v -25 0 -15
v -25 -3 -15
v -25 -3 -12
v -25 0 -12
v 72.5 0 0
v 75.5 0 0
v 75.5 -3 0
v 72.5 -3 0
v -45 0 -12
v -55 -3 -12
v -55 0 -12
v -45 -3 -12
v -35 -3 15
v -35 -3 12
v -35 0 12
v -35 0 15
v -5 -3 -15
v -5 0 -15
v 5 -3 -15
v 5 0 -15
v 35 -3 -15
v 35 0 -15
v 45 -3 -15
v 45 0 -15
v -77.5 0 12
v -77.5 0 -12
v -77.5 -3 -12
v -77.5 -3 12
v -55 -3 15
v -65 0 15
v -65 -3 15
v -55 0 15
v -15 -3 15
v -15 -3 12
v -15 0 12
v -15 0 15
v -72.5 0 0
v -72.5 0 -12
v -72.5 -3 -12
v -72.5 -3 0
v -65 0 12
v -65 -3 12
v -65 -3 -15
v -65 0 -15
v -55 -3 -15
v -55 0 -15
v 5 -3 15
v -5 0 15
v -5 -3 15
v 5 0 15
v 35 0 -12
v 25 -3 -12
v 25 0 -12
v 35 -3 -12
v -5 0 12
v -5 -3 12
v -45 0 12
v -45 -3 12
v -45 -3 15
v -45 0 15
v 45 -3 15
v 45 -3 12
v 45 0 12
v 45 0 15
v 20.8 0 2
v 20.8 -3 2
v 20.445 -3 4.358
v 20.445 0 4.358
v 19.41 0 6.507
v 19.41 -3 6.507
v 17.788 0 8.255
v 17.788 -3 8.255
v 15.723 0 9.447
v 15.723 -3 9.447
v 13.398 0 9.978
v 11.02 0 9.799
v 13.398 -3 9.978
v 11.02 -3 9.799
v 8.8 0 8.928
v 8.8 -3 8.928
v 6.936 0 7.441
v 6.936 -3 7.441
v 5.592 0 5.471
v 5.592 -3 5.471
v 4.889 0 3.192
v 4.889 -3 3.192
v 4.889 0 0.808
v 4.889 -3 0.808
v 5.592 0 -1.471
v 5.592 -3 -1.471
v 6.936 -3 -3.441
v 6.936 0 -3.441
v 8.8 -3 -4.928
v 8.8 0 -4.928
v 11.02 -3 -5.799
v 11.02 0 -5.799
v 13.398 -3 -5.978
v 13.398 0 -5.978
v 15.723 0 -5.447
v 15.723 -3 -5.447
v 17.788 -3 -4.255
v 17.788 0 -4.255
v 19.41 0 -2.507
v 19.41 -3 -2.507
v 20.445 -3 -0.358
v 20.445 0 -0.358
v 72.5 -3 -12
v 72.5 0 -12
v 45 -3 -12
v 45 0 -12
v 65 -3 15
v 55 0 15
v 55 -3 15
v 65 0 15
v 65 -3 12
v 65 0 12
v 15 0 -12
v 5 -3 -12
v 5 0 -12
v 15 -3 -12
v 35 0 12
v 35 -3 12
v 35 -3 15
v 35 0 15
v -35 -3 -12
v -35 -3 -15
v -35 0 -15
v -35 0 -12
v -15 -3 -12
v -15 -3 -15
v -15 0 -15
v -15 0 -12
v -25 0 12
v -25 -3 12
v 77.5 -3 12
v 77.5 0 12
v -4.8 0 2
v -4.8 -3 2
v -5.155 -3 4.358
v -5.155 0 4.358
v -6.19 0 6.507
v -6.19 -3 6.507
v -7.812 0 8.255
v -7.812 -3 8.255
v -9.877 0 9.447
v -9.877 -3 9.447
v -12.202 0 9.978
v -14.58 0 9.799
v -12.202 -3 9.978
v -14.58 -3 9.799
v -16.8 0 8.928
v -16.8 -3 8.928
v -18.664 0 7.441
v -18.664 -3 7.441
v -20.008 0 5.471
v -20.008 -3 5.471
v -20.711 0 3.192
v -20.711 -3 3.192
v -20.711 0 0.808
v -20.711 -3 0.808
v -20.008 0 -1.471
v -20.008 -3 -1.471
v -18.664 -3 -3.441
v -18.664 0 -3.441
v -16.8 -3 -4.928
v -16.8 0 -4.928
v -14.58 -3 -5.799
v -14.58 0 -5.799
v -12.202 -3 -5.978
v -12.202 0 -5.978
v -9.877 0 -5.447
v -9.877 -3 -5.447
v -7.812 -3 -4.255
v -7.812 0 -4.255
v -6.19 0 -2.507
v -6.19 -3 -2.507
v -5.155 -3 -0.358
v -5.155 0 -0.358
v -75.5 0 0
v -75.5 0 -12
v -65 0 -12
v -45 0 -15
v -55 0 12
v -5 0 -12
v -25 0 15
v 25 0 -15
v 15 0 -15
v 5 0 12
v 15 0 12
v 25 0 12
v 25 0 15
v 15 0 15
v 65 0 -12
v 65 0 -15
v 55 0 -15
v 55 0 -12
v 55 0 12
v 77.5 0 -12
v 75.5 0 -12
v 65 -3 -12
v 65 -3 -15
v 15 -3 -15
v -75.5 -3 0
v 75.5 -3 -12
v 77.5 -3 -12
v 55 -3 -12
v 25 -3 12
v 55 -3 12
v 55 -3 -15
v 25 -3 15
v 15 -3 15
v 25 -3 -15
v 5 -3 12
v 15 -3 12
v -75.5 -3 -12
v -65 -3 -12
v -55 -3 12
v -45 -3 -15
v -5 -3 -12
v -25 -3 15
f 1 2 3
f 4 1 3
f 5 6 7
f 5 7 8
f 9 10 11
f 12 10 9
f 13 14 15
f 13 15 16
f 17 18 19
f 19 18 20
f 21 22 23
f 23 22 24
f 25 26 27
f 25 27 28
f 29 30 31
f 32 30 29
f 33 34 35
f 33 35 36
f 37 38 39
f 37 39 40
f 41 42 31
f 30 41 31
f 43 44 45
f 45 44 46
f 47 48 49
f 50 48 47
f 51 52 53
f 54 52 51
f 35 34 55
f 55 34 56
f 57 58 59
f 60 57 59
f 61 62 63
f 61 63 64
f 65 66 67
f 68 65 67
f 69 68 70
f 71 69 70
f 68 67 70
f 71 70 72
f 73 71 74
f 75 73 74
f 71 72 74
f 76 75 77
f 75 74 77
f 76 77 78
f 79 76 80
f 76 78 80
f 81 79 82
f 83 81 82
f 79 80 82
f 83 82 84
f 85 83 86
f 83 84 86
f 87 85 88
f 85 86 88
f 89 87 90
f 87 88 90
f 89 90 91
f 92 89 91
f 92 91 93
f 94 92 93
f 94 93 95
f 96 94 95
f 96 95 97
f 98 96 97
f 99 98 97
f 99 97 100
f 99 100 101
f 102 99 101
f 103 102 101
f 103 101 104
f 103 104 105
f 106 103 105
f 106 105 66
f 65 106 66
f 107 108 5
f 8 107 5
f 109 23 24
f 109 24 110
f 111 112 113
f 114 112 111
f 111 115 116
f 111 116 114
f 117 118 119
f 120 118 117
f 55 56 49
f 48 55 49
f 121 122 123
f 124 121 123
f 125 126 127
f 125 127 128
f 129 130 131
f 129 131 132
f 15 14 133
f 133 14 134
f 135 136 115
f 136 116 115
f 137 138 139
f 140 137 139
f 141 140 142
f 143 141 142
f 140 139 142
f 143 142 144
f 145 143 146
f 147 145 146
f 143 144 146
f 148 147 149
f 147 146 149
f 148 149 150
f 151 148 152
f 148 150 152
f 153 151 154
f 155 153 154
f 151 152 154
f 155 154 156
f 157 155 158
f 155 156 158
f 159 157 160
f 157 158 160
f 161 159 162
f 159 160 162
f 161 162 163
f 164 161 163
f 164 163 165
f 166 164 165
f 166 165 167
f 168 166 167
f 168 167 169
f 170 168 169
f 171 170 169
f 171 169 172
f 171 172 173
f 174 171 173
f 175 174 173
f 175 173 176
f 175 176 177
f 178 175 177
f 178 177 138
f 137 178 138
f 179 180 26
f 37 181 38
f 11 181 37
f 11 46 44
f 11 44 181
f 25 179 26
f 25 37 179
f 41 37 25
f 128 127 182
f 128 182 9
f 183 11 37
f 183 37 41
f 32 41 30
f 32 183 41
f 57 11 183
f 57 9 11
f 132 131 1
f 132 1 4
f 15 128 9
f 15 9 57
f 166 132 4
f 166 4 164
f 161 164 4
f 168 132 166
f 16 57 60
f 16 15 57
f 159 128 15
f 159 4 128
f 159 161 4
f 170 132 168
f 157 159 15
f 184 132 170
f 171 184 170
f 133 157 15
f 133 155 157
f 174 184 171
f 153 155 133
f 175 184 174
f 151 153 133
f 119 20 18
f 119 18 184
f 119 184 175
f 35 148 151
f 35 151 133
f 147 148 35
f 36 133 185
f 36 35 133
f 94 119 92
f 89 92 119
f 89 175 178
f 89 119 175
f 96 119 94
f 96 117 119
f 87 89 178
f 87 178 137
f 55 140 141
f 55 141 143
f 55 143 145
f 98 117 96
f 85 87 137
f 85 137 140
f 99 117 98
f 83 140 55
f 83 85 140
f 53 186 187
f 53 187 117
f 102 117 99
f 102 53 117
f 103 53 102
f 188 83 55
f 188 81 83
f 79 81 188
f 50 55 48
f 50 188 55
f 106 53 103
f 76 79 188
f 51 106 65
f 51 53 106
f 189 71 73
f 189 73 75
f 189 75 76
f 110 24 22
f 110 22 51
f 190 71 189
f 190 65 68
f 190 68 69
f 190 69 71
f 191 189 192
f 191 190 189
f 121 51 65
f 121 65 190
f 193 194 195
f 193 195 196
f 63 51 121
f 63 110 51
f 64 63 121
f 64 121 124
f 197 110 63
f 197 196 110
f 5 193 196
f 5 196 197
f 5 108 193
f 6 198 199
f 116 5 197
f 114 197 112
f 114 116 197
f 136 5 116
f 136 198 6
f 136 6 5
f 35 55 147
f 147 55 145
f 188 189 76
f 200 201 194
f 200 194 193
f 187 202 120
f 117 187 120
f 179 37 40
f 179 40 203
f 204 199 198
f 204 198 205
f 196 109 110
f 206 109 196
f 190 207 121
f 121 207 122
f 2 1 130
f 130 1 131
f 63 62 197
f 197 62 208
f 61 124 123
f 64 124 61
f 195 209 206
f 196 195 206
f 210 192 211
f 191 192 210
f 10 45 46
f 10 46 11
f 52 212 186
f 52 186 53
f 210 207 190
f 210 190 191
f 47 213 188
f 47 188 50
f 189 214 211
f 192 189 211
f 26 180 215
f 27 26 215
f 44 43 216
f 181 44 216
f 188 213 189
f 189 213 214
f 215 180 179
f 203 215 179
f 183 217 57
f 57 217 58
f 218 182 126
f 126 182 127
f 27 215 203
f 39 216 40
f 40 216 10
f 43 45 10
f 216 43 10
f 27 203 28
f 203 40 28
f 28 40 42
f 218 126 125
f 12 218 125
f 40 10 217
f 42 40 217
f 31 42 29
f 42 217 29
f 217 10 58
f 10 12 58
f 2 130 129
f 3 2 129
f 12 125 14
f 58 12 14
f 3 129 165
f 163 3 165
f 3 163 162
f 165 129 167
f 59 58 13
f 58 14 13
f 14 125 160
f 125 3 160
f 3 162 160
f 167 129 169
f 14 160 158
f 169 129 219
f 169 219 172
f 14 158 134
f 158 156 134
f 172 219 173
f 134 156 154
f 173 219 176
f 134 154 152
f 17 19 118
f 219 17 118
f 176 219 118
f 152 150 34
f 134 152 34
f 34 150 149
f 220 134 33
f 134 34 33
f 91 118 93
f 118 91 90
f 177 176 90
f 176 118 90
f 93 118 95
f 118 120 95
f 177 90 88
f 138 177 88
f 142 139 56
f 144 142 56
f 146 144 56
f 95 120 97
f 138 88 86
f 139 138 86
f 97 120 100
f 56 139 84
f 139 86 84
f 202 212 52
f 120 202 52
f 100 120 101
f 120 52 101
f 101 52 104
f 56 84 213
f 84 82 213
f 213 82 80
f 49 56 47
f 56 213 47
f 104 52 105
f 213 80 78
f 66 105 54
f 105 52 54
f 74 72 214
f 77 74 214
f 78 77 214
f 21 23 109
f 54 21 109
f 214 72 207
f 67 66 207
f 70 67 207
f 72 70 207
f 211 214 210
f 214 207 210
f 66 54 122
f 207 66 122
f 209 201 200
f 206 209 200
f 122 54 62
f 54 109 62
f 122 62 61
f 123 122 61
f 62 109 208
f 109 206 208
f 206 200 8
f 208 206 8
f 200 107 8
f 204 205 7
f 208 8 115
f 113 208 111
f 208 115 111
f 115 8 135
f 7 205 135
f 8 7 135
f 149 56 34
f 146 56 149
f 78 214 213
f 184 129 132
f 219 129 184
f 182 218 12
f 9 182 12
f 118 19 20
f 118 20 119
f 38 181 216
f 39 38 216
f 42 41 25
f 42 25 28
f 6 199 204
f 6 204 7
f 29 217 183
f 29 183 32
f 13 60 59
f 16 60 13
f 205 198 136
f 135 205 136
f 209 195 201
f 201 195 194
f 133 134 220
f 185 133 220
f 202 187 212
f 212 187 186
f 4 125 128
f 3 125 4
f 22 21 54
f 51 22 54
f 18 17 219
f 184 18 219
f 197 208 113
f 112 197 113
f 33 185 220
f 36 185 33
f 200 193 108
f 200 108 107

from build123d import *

# Parameters (mm, degrees)
F0_W     = 145
F0_H     = 30
F1_DEPTH = 3
F2_W     = 10
F2_H     = 3
F3_DEPTH = 25
F4_DEPTH = 5
F5_DEPTH = 5
F6_W     = 3
F6_H     = 12
F7_DEPTH = 25
F8_R     = 8
F9_DEPTH = 25


with BuildPart() as f1:
    # F0 (on Front) → F1 (new body)
    with BuildSketch(Plane.XZ):
        Rectangle(F0_W, F0_H)
    extrude(amount=F1_DEPTH)

    # F2 (on face) → F3 (cut)
    with BuildSketch(Plane.XZ.offset(3)):
        with Locations((-70, -13.5)):
            Rectangle(F2_W, F2_H)
        with Locations((-70, 13.5)):
            Rectangle(F2_W, F2_H)
        with Locations((-50, -13.5)):
            Rectangle(F2_W, F2_H)
        with Locations((-50, 13.5)):
            Rectangle(F2_W, F2_H)
        with Locations((-30, -13.5)):
            Rectangle(F2_W, F2_H)
        with Locations((-30, 13.5)):
            Rectangle(F2_W, F2_H)
        with Locations((-10, -13.5)):
            Rectangle(F2_W, F2_H)
        with Locations((-10, 13.5)):
            Rectangle(F2_W, F2_H)
        with Locations((10, -13.5)):
            Rectangle(F2_W, F2_H)
        with Locations((10, 13.5)):
            Rectangle(F2_W, F2_H)
        with Locations((30, -13.5)):
            Rectangle(F2_W, F2_H)
        with Locations((30, 13.5)):
            Rectangle(F2_W, F2_H)
        with Locations((50, -13.5)):
            Rectangle(F2_W, F2_H)
        with Locations((50, 13.5)):
            Rectangle(F2_W, F2_H)
        with Locations((70, -13.5)):
            Rectangle(F2_W, F2_H)
        with Locations((70, 13.5)):
            Rectangle(F2_W, F2_H)
    extrude(amount=-F3_DEPTH, mode=Mode.SUBTRACT)

    # F4 (add): faces of the model
    f4_faces = [f1.faces().sort_by_distance(p)[0] for p in [
        (72.5, -1.5, 0),
        (-72.5, -1.5, 0),
    ]]
    extrude(f4_faces, amount=F4_DEPTH, dir=(1, 0, 0))

    # F5 (add): a face of the model
    f5_faces = [f1.faces().sort_by_distance(p)[0] for p in [
        (-72.5, -1.5, 0),
    ]]
    extrude(f5_faces, amount=F5_DEPTH)

    # F6 (on face) → F7 (cut)
    with BuildSketch(Plane(origin=(0, 0, 0), x_dir=(-1, 0, 0), z_dir=(0, 1, 0))):
        with Locations((-74, -6)):
            Rectangle(F6_W, F6_H)
        with Locations((74, -6)):
            Rectangle(F6_W, F6_H)
    extrude(amount=-F7_DEPTH, mode=Mode.SUBTRACT)

    # F8 (on face) → F9 (cut)
    with BuildSketch(Plane.XZ.offset(3)):
        with Locations((-12.8, 2)):
            Circle(F8_R)
        with Locations((12.8, 2)):
            Circle(F8_R)
    extrude(amount=-F9_DEPTH, mode=Mode.SUBTRACT)


solid = f1.part
